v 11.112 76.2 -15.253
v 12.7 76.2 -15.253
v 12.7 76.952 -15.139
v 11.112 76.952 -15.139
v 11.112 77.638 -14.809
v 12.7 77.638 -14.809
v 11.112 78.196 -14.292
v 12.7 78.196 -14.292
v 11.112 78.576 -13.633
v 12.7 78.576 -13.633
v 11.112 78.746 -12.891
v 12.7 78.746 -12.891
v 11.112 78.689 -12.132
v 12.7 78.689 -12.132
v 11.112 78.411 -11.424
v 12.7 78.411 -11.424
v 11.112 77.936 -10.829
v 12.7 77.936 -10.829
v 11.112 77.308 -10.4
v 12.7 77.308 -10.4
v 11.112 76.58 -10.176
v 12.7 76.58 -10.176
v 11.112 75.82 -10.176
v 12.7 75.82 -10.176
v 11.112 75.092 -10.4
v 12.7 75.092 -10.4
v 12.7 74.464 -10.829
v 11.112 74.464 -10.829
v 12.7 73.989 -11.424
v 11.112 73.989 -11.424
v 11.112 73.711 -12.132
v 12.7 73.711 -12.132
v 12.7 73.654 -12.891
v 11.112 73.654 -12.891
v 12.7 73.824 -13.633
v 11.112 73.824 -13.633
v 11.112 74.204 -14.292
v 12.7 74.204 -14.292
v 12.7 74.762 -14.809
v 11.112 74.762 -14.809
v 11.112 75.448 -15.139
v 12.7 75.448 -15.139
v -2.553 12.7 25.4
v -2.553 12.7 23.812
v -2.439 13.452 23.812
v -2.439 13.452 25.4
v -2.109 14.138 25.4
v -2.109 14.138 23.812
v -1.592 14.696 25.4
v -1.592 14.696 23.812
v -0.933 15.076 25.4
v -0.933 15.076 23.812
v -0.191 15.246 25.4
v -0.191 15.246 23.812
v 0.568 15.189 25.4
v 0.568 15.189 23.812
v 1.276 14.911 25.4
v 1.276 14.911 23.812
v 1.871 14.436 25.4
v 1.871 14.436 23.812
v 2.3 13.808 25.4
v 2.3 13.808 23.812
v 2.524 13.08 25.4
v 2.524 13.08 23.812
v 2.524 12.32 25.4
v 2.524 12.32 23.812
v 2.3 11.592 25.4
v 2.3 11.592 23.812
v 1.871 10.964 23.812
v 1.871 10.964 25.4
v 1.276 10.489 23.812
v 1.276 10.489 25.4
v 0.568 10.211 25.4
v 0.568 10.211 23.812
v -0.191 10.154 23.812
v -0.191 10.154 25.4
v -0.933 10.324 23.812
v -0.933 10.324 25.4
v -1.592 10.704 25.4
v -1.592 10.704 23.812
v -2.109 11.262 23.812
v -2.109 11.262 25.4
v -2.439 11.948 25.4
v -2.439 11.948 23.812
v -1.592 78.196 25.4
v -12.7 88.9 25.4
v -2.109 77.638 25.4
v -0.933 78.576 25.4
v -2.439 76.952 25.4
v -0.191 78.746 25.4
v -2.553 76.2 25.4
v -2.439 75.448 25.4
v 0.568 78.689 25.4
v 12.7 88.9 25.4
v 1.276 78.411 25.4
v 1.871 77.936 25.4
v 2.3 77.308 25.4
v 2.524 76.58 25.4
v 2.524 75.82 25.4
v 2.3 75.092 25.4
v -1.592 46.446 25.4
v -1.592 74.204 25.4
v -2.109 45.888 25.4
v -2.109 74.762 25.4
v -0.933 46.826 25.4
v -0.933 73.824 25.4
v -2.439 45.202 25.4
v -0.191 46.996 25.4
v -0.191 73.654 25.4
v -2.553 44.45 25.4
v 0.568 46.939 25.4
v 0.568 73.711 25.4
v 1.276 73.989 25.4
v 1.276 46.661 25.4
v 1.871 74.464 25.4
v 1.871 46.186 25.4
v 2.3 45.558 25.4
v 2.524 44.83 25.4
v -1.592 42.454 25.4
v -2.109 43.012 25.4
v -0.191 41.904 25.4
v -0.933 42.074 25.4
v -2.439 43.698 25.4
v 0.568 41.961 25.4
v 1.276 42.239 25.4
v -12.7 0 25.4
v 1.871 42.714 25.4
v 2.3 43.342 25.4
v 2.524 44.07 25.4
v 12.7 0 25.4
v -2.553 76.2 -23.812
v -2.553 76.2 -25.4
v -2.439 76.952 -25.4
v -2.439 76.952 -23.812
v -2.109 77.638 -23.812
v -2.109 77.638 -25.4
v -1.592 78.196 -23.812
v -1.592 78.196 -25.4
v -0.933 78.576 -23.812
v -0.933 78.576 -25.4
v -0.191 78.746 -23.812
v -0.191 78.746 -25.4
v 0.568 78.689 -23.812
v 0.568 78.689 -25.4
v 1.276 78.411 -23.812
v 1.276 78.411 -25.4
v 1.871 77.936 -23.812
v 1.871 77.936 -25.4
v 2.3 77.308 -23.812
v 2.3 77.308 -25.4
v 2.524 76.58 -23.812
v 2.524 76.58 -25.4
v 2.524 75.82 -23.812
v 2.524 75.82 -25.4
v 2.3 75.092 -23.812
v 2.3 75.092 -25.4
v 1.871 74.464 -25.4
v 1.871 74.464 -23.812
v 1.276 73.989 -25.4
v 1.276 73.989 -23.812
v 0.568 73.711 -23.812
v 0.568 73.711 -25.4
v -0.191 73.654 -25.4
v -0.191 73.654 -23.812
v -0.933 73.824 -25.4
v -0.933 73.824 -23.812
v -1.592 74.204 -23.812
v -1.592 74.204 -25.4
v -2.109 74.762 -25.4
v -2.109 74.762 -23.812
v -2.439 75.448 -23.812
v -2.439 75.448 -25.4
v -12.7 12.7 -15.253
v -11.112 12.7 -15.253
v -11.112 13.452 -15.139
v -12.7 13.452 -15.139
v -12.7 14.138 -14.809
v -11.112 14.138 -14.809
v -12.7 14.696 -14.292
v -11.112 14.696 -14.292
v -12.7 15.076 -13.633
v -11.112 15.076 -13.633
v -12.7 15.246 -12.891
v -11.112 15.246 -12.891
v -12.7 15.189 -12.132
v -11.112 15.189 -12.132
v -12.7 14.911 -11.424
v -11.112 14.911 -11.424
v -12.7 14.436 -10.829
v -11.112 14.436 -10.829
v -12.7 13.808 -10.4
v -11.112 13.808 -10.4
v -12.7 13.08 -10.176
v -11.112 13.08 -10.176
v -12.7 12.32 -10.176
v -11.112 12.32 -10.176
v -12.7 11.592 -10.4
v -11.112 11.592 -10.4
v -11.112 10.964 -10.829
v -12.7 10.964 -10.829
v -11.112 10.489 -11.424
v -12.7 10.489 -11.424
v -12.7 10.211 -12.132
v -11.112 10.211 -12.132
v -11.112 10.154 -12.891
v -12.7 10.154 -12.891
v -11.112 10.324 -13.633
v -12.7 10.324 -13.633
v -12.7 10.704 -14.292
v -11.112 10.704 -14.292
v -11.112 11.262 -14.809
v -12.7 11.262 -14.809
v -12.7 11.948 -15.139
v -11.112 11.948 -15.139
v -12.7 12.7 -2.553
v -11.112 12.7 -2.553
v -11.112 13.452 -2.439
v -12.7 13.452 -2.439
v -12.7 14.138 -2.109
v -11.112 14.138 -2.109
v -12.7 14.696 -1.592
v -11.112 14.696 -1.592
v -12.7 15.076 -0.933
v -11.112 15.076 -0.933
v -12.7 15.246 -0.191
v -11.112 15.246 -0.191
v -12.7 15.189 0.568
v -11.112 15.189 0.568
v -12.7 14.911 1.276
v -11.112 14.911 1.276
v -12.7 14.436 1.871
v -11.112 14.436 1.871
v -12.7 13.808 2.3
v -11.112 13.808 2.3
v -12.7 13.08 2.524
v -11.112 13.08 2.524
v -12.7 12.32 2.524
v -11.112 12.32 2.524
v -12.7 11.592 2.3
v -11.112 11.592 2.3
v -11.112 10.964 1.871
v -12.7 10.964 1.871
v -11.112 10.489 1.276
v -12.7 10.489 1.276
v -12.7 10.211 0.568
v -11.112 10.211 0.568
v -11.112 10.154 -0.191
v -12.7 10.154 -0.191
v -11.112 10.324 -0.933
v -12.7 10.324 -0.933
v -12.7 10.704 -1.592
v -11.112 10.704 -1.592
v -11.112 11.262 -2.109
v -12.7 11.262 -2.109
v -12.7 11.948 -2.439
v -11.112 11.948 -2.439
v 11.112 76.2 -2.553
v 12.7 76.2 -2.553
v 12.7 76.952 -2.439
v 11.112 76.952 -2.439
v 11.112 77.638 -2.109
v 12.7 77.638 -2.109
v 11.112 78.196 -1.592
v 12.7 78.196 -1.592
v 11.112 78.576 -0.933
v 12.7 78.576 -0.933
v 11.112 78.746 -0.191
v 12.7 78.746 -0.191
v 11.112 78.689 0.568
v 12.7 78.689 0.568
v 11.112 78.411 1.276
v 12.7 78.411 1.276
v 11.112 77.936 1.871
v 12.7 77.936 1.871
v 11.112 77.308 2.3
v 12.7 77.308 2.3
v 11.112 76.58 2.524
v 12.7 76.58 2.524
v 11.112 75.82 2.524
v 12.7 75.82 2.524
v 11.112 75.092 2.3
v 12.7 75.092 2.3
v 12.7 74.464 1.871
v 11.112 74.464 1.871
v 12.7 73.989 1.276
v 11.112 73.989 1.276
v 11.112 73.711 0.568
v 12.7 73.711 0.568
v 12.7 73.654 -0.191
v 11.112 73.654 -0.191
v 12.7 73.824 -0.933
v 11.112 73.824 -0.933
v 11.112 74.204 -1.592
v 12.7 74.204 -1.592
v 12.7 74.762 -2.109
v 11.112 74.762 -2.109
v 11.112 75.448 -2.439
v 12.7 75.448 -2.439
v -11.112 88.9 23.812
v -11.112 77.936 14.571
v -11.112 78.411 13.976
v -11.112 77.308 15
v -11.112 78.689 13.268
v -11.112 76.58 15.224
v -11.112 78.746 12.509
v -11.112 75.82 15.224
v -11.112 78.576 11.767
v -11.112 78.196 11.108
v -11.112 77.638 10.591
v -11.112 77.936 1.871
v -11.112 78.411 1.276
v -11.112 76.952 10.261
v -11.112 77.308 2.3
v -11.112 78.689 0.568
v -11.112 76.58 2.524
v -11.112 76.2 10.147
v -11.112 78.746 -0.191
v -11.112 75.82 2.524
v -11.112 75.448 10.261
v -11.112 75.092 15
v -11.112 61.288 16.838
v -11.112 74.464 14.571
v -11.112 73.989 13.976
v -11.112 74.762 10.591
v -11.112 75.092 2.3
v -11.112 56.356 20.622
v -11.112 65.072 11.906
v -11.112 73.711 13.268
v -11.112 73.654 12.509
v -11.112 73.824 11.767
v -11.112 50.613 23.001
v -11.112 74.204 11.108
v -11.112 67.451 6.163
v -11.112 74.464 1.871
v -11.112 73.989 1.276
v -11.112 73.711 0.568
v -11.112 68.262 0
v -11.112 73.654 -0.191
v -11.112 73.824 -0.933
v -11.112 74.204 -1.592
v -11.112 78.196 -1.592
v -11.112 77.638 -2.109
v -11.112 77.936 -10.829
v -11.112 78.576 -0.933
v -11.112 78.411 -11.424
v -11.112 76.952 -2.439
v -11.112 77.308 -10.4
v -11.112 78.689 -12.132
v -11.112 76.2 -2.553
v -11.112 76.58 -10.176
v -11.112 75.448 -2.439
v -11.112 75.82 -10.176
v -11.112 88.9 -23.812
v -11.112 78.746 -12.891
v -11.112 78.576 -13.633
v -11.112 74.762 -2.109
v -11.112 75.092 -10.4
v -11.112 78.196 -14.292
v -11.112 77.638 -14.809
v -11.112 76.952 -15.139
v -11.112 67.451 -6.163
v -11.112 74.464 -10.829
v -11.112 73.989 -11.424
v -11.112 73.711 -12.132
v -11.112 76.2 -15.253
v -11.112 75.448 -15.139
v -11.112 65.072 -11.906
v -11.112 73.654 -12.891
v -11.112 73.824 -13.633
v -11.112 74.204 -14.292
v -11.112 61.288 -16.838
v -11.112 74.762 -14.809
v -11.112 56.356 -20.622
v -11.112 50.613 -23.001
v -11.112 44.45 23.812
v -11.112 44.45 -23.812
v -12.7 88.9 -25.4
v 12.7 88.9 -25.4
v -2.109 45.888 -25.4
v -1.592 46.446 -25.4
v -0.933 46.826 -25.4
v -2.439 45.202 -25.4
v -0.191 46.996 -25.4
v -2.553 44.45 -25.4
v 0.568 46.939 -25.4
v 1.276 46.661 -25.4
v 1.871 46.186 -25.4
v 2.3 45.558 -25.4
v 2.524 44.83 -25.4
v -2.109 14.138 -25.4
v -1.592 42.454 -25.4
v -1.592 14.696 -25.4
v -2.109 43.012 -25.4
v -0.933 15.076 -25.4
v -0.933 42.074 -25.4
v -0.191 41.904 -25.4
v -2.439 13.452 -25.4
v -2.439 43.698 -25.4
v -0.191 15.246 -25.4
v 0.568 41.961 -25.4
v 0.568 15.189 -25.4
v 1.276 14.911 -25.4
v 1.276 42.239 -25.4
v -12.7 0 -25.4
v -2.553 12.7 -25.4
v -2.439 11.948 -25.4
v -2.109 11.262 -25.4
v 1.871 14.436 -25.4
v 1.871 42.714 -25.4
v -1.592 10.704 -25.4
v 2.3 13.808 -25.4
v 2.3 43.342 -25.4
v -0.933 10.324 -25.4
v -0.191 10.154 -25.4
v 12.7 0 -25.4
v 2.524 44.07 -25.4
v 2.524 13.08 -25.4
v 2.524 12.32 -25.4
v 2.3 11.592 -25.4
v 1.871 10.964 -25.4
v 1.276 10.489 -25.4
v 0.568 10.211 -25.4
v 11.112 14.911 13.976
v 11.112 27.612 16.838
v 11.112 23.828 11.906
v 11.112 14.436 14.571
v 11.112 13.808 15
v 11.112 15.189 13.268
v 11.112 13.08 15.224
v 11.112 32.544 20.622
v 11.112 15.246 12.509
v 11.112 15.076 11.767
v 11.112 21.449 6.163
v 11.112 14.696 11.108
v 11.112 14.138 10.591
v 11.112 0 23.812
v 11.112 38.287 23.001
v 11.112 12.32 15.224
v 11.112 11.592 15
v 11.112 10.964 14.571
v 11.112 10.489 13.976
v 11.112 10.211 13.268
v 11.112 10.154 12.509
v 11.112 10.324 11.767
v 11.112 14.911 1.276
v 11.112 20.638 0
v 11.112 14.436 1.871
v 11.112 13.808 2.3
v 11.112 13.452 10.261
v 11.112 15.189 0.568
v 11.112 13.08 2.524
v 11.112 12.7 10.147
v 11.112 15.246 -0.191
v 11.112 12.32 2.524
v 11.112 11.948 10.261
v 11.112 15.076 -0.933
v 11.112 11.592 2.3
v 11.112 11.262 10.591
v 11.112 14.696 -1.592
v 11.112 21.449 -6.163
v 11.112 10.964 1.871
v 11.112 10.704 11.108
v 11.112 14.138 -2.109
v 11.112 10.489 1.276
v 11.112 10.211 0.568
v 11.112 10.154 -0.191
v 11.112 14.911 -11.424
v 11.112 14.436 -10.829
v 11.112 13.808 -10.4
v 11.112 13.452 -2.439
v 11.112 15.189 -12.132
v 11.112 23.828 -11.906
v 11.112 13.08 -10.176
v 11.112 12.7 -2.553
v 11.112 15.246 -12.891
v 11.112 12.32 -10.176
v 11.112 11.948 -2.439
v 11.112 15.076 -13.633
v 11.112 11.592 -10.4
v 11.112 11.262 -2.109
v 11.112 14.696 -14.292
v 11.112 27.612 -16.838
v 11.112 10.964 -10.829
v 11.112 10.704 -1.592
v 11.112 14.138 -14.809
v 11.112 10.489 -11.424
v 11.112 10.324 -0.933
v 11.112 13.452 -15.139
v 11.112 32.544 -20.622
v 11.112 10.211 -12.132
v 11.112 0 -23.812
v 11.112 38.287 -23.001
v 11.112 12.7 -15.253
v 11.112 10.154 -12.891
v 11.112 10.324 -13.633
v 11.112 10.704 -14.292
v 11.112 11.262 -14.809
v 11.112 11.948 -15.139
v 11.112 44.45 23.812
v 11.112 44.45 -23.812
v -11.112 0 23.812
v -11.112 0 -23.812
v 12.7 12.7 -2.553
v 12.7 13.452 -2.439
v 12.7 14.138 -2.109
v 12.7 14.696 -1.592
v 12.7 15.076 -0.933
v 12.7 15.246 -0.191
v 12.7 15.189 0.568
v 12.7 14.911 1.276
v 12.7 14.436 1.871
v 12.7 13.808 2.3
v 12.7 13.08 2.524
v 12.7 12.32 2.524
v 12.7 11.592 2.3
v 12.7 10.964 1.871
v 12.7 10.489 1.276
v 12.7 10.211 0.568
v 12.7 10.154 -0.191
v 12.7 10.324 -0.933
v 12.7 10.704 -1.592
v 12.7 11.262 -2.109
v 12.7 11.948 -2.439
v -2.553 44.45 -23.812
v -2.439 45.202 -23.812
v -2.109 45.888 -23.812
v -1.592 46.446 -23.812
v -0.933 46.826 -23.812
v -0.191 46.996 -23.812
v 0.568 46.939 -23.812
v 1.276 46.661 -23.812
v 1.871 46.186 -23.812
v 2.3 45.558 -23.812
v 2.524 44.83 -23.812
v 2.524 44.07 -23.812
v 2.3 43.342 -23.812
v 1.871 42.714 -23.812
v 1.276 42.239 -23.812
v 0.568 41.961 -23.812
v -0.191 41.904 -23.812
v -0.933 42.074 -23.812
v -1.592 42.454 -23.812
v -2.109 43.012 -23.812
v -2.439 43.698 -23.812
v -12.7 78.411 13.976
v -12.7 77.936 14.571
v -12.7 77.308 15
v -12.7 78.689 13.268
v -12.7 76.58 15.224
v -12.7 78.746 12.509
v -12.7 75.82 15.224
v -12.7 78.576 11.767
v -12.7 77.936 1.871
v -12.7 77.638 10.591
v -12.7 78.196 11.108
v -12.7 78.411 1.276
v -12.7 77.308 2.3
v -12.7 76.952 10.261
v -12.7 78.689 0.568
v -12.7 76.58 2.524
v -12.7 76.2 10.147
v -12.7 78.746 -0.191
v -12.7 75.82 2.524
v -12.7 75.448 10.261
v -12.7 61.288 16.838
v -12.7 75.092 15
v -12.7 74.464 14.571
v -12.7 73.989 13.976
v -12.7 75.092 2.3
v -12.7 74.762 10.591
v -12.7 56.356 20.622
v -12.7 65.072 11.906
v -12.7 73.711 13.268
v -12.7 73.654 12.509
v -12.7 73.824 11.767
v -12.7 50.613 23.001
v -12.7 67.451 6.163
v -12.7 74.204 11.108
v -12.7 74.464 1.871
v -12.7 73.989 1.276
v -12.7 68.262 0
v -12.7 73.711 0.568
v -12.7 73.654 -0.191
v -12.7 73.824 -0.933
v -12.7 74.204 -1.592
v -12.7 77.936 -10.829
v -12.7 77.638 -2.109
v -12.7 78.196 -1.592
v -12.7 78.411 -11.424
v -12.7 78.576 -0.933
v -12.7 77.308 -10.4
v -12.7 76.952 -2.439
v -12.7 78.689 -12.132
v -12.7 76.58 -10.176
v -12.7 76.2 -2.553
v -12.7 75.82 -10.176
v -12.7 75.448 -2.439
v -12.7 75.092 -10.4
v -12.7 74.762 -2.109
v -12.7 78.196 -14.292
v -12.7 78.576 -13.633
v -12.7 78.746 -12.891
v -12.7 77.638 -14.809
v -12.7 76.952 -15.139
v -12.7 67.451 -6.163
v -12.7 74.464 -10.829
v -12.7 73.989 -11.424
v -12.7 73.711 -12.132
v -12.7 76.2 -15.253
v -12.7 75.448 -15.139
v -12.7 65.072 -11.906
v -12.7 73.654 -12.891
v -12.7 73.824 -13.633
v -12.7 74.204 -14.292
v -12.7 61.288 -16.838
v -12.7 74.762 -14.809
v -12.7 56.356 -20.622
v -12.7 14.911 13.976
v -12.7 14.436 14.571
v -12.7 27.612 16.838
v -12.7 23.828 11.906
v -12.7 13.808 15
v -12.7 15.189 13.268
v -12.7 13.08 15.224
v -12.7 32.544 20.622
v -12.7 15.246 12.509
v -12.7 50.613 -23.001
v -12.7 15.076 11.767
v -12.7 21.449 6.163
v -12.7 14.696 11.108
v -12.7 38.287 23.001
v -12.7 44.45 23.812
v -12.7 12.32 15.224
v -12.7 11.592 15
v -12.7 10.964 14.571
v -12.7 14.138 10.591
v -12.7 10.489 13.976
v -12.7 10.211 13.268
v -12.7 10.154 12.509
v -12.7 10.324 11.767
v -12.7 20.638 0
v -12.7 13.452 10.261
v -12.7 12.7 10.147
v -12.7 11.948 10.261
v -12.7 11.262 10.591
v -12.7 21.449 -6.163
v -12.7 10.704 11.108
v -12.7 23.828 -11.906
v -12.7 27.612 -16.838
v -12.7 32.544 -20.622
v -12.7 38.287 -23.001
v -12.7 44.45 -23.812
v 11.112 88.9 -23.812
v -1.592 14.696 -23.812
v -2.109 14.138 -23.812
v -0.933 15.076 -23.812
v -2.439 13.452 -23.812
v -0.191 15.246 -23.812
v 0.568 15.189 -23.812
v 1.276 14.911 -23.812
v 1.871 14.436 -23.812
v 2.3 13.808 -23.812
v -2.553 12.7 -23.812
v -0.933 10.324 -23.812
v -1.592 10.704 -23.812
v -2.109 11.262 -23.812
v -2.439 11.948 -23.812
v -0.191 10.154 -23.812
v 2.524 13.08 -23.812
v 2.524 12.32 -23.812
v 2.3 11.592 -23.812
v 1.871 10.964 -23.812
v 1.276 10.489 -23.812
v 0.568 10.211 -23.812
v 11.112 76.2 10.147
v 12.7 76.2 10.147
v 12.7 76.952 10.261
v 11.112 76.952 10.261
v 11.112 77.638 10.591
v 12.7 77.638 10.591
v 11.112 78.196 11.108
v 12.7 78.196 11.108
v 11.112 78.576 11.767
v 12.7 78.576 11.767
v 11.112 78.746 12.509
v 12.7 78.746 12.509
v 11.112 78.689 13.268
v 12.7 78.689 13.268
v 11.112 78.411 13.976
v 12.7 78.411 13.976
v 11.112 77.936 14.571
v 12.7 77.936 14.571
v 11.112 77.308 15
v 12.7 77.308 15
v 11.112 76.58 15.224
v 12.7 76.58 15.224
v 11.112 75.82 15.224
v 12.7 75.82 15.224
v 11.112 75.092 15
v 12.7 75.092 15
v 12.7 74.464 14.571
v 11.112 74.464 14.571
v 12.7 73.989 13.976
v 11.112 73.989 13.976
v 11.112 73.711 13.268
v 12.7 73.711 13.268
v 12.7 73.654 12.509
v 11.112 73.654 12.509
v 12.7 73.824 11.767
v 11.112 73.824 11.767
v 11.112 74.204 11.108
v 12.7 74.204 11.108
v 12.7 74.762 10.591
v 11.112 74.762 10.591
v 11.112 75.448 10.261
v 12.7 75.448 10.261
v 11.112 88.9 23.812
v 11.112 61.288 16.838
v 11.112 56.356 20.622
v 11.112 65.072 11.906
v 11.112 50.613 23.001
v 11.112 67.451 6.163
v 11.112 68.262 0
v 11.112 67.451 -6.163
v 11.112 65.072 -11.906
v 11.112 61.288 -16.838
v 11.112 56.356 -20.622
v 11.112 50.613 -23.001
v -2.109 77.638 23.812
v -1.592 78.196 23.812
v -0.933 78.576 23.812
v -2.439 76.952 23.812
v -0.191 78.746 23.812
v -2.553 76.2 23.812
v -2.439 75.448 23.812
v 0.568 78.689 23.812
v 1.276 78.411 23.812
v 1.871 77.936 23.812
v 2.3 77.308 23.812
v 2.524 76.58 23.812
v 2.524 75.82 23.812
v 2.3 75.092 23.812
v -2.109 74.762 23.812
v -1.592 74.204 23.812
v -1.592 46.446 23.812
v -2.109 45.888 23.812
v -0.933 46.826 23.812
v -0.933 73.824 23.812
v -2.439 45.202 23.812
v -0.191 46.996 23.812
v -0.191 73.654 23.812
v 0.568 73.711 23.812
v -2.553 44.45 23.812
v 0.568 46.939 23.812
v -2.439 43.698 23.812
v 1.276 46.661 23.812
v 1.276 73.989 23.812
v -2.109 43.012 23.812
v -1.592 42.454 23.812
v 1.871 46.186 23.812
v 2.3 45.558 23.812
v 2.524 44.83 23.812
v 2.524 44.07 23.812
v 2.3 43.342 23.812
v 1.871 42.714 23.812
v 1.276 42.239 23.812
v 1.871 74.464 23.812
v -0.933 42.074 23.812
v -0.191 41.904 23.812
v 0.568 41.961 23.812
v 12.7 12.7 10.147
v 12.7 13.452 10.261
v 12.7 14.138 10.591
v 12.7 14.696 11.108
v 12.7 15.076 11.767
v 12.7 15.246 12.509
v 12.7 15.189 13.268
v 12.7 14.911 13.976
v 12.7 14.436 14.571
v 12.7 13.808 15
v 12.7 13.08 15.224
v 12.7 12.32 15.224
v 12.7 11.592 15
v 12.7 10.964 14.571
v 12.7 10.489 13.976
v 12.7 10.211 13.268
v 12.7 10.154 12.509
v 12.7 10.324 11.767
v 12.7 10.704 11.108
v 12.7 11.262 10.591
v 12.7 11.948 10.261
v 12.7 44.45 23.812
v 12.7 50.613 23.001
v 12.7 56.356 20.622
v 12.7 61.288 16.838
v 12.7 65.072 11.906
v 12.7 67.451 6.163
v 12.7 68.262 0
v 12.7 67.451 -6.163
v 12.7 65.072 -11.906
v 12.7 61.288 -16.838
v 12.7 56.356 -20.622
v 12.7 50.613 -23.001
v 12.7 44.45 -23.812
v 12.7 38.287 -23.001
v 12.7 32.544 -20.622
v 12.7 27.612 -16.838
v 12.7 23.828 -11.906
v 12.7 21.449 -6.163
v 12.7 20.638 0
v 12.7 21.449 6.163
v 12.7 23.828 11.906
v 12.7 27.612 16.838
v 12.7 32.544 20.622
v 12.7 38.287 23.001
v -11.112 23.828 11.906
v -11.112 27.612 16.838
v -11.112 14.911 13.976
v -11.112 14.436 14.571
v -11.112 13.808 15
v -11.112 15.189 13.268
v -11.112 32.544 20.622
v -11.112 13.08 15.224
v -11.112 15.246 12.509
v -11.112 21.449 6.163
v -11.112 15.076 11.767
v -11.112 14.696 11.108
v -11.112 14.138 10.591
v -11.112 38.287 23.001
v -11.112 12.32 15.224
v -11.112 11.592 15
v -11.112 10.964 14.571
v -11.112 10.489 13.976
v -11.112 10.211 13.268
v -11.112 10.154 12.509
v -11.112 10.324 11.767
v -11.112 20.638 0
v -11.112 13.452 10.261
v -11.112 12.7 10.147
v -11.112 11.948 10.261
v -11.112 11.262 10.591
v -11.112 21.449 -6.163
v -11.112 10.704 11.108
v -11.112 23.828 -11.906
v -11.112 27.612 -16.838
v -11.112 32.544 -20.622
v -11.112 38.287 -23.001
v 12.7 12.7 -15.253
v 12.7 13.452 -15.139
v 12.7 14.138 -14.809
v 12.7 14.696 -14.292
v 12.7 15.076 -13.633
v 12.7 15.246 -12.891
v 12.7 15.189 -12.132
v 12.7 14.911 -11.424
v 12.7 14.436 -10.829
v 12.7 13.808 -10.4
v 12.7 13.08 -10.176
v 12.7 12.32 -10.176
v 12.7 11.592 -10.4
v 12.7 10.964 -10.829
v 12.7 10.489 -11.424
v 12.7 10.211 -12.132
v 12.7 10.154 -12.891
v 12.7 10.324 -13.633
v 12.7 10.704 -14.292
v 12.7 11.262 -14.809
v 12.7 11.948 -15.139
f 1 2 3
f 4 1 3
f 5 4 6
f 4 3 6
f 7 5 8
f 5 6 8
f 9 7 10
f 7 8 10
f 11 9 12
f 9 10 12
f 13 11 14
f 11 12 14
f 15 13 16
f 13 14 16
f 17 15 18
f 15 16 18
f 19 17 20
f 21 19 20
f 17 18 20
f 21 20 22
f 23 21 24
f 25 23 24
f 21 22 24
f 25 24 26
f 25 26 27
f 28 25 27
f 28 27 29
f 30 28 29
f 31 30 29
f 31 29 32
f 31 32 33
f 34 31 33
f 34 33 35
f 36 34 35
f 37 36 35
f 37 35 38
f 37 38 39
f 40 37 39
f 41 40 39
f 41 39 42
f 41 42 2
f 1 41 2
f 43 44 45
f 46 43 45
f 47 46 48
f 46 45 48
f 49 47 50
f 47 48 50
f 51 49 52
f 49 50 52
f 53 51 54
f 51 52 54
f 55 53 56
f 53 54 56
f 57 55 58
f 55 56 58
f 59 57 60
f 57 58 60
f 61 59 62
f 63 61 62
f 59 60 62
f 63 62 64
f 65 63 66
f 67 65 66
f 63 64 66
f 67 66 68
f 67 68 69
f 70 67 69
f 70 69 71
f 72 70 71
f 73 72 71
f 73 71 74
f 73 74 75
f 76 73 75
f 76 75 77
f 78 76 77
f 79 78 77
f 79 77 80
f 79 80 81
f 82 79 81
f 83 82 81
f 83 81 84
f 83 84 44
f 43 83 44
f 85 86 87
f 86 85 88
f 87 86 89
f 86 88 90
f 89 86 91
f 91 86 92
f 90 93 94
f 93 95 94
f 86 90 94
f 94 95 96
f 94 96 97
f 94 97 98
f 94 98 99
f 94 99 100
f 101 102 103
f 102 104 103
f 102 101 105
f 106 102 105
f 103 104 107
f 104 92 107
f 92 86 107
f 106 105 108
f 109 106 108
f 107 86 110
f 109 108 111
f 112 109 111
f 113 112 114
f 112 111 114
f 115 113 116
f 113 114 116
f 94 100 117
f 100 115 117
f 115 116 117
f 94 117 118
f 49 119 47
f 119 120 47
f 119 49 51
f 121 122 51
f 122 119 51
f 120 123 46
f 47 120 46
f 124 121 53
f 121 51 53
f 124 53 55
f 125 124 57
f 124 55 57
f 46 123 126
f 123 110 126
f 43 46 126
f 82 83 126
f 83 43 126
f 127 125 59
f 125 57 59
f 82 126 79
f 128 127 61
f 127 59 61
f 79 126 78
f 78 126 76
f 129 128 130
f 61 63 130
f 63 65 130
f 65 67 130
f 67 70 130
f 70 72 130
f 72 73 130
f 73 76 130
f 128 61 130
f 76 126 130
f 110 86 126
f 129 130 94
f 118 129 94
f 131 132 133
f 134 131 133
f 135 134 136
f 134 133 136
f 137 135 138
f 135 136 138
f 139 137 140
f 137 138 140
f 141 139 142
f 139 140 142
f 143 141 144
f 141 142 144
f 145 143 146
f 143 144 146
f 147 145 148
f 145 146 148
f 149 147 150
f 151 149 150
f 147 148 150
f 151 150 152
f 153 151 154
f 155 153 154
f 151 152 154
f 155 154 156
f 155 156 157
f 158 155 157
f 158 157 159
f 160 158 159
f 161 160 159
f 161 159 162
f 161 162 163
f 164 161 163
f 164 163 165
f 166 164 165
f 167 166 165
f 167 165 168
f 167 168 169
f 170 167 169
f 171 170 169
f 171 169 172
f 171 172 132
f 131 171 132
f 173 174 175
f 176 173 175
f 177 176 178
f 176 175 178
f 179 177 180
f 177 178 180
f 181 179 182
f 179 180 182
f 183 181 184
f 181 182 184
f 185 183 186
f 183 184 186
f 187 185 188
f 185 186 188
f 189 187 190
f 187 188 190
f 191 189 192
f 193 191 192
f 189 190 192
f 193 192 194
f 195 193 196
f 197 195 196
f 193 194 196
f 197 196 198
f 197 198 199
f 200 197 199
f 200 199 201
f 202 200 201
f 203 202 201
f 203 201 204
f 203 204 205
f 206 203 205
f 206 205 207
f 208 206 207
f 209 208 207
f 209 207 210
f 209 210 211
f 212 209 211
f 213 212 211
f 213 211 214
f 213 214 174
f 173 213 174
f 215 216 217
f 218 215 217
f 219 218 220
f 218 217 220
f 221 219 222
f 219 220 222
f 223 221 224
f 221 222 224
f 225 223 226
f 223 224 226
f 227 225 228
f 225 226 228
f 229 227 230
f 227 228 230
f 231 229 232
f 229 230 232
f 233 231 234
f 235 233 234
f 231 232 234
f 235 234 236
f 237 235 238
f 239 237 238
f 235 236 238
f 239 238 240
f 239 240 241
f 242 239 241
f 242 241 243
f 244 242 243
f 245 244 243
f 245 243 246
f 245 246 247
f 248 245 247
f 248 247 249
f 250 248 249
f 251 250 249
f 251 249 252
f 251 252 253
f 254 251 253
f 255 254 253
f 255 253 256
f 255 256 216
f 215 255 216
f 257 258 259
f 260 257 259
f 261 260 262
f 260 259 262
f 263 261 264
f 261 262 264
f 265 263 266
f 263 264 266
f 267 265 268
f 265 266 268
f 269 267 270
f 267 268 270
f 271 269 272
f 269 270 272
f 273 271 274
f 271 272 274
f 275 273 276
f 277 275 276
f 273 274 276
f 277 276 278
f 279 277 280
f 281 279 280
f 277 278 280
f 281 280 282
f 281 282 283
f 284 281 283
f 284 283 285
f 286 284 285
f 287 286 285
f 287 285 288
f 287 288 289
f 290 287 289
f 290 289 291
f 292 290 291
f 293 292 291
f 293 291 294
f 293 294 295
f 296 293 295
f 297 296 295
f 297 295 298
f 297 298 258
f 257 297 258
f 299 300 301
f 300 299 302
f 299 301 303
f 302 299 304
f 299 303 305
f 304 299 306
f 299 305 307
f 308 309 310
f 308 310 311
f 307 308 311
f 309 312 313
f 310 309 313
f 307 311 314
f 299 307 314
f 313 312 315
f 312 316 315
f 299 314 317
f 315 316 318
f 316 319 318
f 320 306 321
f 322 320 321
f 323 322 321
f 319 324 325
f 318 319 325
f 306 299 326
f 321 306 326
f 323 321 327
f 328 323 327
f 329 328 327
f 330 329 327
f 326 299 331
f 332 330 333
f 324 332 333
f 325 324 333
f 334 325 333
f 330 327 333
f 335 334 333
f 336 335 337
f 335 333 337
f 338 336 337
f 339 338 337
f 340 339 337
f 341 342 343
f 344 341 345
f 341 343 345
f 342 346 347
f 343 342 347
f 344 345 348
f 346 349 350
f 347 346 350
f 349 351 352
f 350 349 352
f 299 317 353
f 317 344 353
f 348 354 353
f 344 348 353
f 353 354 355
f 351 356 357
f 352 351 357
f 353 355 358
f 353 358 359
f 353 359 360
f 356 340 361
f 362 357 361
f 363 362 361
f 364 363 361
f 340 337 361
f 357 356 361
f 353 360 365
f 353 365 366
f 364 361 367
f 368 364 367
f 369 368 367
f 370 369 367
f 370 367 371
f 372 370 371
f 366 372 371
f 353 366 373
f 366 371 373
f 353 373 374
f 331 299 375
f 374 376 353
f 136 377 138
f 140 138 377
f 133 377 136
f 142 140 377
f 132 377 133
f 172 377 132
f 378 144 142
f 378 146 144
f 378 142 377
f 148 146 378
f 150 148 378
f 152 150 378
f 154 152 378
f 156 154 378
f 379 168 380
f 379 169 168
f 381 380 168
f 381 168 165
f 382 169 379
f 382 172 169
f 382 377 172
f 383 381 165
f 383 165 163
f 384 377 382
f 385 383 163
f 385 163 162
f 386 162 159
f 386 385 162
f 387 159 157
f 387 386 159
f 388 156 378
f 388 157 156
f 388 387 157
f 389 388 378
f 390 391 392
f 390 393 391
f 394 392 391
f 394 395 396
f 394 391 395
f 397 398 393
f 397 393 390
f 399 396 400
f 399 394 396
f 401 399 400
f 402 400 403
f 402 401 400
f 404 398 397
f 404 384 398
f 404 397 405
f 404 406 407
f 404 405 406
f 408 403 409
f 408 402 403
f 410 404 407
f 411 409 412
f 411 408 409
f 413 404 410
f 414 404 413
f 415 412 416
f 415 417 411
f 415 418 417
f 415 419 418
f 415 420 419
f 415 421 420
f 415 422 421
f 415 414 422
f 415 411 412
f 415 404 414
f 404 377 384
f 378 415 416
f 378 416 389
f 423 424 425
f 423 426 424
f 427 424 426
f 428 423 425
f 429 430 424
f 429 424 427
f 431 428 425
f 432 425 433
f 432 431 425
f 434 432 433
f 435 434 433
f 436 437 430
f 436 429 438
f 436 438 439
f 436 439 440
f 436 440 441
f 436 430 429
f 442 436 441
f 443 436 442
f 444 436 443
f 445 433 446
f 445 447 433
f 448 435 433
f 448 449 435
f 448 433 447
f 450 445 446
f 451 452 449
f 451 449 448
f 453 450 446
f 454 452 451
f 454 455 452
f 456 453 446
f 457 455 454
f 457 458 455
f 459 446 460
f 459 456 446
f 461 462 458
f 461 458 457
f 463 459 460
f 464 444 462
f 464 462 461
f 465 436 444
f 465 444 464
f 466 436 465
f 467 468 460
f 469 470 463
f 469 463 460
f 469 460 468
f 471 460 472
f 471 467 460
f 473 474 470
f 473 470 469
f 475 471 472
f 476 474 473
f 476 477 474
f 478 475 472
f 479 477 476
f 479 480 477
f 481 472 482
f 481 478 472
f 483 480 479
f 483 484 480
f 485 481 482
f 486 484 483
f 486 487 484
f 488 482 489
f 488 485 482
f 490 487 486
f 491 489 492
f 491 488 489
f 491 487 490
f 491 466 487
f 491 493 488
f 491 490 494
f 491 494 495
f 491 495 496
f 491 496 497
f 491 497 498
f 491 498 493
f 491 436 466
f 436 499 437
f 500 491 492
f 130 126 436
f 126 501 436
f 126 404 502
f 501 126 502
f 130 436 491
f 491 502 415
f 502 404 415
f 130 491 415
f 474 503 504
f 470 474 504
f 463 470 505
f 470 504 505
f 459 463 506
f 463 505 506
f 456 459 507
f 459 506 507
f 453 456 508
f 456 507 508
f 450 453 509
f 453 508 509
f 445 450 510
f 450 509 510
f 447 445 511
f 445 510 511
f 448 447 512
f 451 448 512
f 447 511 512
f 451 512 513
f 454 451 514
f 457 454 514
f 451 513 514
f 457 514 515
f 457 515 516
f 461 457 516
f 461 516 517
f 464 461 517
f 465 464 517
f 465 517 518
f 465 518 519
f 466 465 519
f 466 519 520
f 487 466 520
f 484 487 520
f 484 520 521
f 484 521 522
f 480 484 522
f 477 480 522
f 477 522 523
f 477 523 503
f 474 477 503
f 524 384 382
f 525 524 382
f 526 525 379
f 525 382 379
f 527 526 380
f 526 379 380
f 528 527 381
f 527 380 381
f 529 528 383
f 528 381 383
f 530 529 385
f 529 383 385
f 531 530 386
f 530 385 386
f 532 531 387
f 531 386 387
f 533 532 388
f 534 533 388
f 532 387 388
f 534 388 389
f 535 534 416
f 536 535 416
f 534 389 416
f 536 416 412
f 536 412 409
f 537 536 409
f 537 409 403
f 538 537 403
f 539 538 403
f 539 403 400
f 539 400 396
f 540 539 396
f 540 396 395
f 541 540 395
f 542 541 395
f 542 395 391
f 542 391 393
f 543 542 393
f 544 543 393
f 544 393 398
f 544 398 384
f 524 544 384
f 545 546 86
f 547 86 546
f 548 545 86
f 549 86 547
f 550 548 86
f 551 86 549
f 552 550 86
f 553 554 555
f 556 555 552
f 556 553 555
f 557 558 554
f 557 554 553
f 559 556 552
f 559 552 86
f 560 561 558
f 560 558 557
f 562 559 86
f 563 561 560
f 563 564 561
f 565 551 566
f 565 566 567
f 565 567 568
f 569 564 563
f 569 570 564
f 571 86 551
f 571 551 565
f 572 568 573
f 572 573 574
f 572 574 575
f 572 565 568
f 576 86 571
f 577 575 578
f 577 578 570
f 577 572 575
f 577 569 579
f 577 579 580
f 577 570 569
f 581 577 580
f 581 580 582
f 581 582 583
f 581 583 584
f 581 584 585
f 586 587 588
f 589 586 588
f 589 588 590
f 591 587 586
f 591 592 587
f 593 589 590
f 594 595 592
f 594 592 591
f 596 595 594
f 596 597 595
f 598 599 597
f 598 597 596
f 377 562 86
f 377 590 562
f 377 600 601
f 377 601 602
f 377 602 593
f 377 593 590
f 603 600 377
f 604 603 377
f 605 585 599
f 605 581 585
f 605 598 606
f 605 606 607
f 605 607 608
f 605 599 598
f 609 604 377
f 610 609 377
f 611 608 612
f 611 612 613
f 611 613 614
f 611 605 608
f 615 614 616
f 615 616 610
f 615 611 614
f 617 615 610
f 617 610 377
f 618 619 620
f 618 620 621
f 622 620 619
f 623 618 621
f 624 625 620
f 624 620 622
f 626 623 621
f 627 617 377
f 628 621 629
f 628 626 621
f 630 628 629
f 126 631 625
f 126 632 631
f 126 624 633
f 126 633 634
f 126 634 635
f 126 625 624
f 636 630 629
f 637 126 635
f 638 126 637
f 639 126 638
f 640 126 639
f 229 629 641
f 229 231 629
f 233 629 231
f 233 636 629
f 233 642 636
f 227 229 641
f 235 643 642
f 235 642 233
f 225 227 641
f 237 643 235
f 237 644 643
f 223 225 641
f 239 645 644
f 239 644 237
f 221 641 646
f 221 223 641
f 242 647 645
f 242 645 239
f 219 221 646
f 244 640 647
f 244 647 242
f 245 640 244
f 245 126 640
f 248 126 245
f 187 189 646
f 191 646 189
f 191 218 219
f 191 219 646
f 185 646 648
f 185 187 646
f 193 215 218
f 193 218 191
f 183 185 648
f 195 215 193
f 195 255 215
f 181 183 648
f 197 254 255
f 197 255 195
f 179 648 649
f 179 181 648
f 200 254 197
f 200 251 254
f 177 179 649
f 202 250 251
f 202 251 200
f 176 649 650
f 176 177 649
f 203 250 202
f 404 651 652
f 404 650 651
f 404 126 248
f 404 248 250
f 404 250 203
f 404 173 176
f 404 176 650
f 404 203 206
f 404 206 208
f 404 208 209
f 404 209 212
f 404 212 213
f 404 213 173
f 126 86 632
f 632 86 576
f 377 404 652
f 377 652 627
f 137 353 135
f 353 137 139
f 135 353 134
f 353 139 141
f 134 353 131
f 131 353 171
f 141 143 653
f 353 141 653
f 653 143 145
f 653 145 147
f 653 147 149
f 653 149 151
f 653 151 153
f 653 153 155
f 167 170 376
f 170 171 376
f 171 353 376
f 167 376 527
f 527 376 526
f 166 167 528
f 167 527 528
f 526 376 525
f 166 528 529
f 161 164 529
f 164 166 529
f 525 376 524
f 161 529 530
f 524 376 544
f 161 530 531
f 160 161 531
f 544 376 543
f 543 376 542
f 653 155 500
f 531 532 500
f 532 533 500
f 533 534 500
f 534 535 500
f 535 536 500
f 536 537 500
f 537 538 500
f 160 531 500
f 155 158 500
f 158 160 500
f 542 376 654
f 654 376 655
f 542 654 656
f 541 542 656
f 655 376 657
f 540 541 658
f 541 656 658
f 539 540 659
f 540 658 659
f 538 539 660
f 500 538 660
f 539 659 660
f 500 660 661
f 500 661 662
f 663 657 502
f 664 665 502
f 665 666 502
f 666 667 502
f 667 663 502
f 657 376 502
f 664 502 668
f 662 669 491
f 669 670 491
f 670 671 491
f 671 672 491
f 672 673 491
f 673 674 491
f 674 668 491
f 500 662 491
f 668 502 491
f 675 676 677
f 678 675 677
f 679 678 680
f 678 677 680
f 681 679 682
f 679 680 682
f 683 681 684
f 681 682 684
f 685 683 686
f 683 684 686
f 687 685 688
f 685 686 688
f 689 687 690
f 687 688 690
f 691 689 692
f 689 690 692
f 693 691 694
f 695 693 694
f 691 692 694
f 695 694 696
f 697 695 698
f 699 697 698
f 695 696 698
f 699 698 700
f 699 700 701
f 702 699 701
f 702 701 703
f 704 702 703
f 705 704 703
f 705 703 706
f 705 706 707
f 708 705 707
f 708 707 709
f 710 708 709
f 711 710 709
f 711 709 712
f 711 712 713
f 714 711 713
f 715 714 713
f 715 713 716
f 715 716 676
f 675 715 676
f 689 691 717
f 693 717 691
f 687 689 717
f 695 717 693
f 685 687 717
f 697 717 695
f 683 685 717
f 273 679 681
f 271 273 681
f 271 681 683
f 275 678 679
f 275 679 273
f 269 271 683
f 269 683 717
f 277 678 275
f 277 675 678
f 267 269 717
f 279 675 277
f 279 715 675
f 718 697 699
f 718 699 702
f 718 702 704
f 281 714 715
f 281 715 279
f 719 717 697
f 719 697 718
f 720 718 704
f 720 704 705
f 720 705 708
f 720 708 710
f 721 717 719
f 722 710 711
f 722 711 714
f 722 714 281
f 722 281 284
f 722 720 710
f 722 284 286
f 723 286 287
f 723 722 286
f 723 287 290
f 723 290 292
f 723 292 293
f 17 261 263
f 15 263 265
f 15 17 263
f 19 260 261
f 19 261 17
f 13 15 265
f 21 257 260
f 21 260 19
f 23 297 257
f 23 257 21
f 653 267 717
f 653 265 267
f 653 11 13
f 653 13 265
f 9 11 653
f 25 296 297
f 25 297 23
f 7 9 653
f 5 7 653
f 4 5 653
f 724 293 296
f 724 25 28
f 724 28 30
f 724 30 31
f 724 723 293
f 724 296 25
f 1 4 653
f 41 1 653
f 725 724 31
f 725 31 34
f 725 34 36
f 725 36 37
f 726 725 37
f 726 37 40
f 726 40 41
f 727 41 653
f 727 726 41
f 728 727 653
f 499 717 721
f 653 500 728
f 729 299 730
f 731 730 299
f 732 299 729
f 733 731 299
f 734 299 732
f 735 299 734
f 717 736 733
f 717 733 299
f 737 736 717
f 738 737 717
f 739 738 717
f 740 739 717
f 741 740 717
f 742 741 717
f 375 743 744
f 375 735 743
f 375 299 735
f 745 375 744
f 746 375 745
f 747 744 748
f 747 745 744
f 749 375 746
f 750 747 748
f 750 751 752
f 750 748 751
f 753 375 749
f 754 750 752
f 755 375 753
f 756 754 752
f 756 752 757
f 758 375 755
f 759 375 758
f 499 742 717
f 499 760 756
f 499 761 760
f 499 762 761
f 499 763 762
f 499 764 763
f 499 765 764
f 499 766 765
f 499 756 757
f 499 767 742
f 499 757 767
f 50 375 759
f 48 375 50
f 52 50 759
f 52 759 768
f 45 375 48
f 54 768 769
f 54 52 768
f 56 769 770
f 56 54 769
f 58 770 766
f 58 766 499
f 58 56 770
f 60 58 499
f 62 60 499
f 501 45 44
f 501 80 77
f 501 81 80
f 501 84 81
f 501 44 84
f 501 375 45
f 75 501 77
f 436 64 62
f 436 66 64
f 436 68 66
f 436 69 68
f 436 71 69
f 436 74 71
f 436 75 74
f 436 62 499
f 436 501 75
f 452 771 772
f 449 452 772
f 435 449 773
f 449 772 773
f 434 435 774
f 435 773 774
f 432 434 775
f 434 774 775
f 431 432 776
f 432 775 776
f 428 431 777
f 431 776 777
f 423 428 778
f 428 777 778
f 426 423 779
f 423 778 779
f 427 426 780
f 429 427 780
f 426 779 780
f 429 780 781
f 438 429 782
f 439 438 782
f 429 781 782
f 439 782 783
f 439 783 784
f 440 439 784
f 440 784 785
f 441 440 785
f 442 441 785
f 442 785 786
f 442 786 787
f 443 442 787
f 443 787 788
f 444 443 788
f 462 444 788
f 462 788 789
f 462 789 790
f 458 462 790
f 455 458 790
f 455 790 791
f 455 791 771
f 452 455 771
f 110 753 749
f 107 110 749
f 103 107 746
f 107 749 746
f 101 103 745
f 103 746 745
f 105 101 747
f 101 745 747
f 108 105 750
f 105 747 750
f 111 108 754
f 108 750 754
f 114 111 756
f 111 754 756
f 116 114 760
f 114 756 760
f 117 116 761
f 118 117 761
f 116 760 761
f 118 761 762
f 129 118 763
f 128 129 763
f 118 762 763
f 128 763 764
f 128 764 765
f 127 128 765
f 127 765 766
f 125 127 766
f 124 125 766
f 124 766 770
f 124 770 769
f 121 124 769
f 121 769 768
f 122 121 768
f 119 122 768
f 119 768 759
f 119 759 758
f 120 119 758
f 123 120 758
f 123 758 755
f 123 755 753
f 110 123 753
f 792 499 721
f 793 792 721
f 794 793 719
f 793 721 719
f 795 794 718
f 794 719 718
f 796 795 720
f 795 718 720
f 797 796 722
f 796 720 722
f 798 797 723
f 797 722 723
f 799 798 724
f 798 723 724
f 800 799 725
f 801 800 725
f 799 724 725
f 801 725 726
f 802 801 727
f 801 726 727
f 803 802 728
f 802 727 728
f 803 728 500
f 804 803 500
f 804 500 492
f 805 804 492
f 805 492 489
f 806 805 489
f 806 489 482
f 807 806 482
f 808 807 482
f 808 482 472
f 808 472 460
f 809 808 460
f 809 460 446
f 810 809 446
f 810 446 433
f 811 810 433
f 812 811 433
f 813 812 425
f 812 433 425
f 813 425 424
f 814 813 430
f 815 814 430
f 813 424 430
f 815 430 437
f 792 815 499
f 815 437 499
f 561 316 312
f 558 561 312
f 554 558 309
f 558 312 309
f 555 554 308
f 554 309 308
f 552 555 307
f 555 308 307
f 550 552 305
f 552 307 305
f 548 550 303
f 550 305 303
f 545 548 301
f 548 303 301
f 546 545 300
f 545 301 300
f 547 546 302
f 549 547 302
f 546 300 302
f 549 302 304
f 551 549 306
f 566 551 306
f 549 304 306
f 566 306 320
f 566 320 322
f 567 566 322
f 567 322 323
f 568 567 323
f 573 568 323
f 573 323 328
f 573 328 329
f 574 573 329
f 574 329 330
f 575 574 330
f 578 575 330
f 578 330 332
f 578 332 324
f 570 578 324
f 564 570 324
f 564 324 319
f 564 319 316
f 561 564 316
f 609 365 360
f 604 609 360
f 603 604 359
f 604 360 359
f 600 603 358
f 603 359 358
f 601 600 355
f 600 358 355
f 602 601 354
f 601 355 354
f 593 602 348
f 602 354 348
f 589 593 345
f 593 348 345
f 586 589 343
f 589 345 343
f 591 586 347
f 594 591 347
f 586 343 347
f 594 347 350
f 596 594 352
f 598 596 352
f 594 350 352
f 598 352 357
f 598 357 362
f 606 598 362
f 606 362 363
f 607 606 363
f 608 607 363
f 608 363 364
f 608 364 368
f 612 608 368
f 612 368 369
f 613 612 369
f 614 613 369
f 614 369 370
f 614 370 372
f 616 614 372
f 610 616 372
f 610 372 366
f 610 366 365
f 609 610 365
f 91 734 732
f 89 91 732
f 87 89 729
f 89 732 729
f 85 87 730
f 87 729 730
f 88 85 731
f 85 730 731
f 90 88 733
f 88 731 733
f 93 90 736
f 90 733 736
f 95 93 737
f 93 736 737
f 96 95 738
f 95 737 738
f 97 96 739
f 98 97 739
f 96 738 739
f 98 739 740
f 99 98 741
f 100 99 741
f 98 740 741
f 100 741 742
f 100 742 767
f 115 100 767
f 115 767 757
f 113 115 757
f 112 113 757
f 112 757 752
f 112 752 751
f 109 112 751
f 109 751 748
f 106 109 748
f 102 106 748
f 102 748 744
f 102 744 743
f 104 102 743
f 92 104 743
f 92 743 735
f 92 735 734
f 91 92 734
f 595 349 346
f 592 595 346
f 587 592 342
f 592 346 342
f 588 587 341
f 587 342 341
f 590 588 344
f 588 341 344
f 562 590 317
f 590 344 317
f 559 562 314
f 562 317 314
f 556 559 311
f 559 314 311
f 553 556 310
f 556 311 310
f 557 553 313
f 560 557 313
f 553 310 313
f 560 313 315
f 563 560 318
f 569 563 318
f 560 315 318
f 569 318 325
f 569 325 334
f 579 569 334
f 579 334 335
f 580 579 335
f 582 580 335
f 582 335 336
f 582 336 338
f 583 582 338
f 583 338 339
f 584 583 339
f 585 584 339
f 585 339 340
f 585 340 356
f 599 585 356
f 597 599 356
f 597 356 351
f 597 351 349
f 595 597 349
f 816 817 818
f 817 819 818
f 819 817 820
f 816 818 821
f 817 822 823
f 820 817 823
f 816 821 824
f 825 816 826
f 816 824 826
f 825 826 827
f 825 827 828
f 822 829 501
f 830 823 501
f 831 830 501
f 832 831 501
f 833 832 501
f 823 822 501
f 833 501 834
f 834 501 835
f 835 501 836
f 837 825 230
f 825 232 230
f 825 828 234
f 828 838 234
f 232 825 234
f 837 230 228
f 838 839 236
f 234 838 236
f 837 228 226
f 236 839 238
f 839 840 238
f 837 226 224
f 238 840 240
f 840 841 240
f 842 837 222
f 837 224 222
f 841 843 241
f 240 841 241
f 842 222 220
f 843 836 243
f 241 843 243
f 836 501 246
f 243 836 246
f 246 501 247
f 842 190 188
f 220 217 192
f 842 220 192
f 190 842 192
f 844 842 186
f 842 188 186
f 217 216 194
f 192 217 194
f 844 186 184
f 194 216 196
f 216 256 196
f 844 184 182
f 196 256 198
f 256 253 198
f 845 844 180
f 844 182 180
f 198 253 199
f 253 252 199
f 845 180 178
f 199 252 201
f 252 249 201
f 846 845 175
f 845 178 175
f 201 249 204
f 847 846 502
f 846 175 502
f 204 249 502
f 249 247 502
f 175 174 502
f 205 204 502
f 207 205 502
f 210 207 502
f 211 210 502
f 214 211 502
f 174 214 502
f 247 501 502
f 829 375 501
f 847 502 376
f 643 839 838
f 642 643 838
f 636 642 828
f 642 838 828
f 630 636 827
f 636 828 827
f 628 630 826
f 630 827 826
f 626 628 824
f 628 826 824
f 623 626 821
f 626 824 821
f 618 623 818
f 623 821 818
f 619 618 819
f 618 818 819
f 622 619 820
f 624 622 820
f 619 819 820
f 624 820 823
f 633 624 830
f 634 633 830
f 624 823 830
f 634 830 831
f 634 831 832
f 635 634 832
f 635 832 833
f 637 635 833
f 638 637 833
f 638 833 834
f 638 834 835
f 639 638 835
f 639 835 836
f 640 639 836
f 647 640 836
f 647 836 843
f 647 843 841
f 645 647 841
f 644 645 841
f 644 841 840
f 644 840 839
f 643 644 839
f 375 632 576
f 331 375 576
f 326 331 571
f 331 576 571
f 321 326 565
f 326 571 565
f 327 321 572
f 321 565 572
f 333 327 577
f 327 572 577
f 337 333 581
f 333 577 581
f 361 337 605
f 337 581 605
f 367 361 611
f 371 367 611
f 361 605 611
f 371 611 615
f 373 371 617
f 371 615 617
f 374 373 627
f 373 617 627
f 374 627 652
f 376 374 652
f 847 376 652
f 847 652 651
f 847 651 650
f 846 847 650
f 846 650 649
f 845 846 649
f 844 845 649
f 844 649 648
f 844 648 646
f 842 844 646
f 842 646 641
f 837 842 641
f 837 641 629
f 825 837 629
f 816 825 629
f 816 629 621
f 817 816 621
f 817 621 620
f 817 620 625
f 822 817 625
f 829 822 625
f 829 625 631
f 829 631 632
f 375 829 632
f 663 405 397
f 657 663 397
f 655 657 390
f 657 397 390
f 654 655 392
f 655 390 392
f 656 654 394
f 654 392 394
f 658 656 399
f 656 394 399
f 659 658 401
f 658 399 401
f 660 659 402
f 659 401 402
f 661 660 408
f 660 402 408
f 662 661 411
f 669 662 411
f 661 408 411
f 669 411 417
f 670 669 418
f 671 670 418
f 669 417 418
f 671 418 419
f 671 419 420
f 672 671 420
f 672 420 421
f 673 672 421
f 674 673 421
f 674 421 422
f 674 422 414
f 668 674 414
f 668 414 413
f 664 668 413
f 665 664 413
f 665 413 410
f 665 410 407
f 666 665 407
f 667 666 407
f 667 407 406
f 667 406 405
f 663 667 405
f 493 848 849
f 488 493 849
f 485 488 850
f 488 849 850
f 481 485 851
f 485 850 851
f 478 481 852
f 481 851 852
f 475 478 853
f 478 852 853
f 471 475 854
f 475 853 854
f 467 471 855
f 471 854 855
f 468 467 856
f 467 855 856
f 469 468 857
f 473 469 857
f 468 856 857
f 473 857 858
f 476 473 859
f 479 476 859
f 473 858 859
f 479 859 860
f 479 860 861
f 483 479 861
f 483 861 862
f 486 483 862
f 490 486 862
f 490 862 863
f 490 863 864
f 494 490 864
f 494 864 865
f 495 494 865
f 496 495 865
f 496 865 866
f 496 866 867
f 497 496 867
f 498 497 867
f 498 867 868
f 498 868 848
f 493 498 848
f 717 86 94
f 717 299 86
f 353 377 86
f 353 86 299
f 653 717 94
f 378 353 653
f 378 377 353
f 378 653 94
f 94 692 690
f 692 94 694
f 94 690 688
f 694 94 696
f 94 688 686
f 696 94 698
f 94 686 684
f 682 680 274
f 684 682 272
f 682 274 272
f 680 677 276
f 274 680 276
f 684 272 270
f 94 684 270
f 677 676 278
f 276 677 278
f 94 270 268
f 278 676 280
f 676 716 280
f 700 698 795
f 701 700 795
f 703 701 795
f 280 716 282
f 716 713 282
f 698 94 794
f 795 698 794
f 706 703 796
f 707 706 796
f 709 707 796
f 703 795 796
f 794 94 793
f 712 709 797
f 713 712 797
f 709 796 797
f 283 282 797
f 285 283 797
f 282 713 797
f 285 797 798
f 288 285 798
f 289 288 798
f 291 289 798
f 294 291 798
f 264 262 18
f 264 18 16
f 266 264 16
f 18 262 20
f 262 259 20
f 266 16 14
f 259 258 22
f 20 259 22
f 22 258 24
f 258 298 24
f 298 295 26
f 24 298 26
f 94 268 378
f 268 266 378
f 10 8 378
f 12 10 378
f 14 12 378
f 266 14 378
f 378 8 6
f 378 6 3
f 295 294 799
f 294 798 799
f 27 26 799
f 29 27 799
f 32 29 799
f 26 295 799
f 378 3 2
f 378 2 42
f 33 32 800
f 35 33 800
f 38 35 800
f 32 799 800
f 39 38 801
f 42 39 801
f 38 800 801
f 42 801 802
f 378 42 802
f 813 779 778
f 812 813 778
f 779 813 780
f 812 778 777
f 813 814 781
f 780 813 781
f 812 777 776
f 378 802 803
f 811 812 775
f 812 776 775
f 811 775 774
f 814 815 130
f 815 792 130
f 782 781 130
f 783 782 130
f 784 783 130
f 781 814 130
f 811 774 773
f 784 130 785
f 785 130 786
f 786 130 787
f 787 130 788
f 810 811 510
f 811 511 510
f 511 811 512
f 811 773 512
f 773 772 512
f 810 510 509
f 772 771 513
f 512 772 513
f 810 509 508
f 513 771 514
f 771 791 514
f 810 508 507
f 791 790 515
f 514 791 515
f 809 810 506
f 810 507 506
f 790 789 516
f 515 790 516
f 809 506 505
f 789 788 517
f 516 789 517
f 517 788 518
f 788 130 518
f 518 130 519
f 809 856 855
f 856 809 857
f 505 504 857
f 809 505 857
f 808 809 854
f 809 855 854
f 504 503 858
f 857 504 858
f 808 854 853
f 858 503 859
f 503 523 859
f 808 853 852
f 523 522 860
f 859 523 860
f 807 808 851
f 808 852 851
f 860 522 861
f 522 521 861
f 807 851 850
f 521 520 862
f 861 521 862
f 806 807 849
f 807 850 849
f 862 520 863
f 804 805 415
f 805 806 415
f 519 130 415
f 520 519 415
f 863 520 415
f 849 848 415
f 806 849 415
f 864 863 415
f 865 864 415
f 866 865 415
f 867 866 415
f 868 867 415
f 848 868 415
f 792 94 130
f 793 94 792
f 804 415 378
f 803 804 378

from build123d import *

# Parameters (mm, degrees)
SKETCH1_W              = 25.4
SKETCH1_H              = 50.8
SKETCH1_W_2            = 22.225
SKETCH1_H_2            = 47.625
EXTRUDE_THIN1_DEPTH    = 88.9
F_10_CLEARANCE_HOLE1_D = 5.1054
F_10_CLEARANCE_HOLE2_D = 5.1054
SKETCH8_R              = 23.8125
CUT_EXTRUDE1_DEPTH     = 26.4


with BuildPart() as part:
    # Sketch1 → Extrude-Thin1 (new body)
    with BuildSketch(Plane(origin=(0, 0, 0), x_dir=(1, 0, 0), z_dir=(0, 1, 0))):
        Rectangle(SKETCH1_W, SKETCH1_H)
        Rectangle(SKETCH1_W_2, SKETCH1_H_2, mode=Mode.SUBTRACT)
    extrude(amount=EXTRUDE_THIN1_DEPTH)

    # #10 Clearance Hole1 (through all)
    with Locations(Plane.ZY.offset(12.7)):
        with Locations((-12.7, 76.2), (0, 76.2), (12.7, 76.2), (-12.7, 12.7), (0, 12.7), (12.7, 12.7)):
            Hole(F_10_CLEARANCE_HOLE1_D / 2)

    # #10 Clearance Hole2 (through all)
    with Locations(Plane.XY.offset(25.4)):
        with Locations((0, 12.7), (0, 76.2), (0, 44.45)):
            Hole(F_10_CLEARANCE_HOLE2_D / 2)

    # Sketch8 → Cut-Extrude1 (cut, through all)
    with BuildSketch(Plane.ZY.offset(12.7)):
        with Locations((0, 44.45)):
            Circle(SKETCH8_R)
    extrude(amount=-CUT_EXTRUDE1_DEPTH, mode=Mode.SUBTRACT)


solid = part.part
